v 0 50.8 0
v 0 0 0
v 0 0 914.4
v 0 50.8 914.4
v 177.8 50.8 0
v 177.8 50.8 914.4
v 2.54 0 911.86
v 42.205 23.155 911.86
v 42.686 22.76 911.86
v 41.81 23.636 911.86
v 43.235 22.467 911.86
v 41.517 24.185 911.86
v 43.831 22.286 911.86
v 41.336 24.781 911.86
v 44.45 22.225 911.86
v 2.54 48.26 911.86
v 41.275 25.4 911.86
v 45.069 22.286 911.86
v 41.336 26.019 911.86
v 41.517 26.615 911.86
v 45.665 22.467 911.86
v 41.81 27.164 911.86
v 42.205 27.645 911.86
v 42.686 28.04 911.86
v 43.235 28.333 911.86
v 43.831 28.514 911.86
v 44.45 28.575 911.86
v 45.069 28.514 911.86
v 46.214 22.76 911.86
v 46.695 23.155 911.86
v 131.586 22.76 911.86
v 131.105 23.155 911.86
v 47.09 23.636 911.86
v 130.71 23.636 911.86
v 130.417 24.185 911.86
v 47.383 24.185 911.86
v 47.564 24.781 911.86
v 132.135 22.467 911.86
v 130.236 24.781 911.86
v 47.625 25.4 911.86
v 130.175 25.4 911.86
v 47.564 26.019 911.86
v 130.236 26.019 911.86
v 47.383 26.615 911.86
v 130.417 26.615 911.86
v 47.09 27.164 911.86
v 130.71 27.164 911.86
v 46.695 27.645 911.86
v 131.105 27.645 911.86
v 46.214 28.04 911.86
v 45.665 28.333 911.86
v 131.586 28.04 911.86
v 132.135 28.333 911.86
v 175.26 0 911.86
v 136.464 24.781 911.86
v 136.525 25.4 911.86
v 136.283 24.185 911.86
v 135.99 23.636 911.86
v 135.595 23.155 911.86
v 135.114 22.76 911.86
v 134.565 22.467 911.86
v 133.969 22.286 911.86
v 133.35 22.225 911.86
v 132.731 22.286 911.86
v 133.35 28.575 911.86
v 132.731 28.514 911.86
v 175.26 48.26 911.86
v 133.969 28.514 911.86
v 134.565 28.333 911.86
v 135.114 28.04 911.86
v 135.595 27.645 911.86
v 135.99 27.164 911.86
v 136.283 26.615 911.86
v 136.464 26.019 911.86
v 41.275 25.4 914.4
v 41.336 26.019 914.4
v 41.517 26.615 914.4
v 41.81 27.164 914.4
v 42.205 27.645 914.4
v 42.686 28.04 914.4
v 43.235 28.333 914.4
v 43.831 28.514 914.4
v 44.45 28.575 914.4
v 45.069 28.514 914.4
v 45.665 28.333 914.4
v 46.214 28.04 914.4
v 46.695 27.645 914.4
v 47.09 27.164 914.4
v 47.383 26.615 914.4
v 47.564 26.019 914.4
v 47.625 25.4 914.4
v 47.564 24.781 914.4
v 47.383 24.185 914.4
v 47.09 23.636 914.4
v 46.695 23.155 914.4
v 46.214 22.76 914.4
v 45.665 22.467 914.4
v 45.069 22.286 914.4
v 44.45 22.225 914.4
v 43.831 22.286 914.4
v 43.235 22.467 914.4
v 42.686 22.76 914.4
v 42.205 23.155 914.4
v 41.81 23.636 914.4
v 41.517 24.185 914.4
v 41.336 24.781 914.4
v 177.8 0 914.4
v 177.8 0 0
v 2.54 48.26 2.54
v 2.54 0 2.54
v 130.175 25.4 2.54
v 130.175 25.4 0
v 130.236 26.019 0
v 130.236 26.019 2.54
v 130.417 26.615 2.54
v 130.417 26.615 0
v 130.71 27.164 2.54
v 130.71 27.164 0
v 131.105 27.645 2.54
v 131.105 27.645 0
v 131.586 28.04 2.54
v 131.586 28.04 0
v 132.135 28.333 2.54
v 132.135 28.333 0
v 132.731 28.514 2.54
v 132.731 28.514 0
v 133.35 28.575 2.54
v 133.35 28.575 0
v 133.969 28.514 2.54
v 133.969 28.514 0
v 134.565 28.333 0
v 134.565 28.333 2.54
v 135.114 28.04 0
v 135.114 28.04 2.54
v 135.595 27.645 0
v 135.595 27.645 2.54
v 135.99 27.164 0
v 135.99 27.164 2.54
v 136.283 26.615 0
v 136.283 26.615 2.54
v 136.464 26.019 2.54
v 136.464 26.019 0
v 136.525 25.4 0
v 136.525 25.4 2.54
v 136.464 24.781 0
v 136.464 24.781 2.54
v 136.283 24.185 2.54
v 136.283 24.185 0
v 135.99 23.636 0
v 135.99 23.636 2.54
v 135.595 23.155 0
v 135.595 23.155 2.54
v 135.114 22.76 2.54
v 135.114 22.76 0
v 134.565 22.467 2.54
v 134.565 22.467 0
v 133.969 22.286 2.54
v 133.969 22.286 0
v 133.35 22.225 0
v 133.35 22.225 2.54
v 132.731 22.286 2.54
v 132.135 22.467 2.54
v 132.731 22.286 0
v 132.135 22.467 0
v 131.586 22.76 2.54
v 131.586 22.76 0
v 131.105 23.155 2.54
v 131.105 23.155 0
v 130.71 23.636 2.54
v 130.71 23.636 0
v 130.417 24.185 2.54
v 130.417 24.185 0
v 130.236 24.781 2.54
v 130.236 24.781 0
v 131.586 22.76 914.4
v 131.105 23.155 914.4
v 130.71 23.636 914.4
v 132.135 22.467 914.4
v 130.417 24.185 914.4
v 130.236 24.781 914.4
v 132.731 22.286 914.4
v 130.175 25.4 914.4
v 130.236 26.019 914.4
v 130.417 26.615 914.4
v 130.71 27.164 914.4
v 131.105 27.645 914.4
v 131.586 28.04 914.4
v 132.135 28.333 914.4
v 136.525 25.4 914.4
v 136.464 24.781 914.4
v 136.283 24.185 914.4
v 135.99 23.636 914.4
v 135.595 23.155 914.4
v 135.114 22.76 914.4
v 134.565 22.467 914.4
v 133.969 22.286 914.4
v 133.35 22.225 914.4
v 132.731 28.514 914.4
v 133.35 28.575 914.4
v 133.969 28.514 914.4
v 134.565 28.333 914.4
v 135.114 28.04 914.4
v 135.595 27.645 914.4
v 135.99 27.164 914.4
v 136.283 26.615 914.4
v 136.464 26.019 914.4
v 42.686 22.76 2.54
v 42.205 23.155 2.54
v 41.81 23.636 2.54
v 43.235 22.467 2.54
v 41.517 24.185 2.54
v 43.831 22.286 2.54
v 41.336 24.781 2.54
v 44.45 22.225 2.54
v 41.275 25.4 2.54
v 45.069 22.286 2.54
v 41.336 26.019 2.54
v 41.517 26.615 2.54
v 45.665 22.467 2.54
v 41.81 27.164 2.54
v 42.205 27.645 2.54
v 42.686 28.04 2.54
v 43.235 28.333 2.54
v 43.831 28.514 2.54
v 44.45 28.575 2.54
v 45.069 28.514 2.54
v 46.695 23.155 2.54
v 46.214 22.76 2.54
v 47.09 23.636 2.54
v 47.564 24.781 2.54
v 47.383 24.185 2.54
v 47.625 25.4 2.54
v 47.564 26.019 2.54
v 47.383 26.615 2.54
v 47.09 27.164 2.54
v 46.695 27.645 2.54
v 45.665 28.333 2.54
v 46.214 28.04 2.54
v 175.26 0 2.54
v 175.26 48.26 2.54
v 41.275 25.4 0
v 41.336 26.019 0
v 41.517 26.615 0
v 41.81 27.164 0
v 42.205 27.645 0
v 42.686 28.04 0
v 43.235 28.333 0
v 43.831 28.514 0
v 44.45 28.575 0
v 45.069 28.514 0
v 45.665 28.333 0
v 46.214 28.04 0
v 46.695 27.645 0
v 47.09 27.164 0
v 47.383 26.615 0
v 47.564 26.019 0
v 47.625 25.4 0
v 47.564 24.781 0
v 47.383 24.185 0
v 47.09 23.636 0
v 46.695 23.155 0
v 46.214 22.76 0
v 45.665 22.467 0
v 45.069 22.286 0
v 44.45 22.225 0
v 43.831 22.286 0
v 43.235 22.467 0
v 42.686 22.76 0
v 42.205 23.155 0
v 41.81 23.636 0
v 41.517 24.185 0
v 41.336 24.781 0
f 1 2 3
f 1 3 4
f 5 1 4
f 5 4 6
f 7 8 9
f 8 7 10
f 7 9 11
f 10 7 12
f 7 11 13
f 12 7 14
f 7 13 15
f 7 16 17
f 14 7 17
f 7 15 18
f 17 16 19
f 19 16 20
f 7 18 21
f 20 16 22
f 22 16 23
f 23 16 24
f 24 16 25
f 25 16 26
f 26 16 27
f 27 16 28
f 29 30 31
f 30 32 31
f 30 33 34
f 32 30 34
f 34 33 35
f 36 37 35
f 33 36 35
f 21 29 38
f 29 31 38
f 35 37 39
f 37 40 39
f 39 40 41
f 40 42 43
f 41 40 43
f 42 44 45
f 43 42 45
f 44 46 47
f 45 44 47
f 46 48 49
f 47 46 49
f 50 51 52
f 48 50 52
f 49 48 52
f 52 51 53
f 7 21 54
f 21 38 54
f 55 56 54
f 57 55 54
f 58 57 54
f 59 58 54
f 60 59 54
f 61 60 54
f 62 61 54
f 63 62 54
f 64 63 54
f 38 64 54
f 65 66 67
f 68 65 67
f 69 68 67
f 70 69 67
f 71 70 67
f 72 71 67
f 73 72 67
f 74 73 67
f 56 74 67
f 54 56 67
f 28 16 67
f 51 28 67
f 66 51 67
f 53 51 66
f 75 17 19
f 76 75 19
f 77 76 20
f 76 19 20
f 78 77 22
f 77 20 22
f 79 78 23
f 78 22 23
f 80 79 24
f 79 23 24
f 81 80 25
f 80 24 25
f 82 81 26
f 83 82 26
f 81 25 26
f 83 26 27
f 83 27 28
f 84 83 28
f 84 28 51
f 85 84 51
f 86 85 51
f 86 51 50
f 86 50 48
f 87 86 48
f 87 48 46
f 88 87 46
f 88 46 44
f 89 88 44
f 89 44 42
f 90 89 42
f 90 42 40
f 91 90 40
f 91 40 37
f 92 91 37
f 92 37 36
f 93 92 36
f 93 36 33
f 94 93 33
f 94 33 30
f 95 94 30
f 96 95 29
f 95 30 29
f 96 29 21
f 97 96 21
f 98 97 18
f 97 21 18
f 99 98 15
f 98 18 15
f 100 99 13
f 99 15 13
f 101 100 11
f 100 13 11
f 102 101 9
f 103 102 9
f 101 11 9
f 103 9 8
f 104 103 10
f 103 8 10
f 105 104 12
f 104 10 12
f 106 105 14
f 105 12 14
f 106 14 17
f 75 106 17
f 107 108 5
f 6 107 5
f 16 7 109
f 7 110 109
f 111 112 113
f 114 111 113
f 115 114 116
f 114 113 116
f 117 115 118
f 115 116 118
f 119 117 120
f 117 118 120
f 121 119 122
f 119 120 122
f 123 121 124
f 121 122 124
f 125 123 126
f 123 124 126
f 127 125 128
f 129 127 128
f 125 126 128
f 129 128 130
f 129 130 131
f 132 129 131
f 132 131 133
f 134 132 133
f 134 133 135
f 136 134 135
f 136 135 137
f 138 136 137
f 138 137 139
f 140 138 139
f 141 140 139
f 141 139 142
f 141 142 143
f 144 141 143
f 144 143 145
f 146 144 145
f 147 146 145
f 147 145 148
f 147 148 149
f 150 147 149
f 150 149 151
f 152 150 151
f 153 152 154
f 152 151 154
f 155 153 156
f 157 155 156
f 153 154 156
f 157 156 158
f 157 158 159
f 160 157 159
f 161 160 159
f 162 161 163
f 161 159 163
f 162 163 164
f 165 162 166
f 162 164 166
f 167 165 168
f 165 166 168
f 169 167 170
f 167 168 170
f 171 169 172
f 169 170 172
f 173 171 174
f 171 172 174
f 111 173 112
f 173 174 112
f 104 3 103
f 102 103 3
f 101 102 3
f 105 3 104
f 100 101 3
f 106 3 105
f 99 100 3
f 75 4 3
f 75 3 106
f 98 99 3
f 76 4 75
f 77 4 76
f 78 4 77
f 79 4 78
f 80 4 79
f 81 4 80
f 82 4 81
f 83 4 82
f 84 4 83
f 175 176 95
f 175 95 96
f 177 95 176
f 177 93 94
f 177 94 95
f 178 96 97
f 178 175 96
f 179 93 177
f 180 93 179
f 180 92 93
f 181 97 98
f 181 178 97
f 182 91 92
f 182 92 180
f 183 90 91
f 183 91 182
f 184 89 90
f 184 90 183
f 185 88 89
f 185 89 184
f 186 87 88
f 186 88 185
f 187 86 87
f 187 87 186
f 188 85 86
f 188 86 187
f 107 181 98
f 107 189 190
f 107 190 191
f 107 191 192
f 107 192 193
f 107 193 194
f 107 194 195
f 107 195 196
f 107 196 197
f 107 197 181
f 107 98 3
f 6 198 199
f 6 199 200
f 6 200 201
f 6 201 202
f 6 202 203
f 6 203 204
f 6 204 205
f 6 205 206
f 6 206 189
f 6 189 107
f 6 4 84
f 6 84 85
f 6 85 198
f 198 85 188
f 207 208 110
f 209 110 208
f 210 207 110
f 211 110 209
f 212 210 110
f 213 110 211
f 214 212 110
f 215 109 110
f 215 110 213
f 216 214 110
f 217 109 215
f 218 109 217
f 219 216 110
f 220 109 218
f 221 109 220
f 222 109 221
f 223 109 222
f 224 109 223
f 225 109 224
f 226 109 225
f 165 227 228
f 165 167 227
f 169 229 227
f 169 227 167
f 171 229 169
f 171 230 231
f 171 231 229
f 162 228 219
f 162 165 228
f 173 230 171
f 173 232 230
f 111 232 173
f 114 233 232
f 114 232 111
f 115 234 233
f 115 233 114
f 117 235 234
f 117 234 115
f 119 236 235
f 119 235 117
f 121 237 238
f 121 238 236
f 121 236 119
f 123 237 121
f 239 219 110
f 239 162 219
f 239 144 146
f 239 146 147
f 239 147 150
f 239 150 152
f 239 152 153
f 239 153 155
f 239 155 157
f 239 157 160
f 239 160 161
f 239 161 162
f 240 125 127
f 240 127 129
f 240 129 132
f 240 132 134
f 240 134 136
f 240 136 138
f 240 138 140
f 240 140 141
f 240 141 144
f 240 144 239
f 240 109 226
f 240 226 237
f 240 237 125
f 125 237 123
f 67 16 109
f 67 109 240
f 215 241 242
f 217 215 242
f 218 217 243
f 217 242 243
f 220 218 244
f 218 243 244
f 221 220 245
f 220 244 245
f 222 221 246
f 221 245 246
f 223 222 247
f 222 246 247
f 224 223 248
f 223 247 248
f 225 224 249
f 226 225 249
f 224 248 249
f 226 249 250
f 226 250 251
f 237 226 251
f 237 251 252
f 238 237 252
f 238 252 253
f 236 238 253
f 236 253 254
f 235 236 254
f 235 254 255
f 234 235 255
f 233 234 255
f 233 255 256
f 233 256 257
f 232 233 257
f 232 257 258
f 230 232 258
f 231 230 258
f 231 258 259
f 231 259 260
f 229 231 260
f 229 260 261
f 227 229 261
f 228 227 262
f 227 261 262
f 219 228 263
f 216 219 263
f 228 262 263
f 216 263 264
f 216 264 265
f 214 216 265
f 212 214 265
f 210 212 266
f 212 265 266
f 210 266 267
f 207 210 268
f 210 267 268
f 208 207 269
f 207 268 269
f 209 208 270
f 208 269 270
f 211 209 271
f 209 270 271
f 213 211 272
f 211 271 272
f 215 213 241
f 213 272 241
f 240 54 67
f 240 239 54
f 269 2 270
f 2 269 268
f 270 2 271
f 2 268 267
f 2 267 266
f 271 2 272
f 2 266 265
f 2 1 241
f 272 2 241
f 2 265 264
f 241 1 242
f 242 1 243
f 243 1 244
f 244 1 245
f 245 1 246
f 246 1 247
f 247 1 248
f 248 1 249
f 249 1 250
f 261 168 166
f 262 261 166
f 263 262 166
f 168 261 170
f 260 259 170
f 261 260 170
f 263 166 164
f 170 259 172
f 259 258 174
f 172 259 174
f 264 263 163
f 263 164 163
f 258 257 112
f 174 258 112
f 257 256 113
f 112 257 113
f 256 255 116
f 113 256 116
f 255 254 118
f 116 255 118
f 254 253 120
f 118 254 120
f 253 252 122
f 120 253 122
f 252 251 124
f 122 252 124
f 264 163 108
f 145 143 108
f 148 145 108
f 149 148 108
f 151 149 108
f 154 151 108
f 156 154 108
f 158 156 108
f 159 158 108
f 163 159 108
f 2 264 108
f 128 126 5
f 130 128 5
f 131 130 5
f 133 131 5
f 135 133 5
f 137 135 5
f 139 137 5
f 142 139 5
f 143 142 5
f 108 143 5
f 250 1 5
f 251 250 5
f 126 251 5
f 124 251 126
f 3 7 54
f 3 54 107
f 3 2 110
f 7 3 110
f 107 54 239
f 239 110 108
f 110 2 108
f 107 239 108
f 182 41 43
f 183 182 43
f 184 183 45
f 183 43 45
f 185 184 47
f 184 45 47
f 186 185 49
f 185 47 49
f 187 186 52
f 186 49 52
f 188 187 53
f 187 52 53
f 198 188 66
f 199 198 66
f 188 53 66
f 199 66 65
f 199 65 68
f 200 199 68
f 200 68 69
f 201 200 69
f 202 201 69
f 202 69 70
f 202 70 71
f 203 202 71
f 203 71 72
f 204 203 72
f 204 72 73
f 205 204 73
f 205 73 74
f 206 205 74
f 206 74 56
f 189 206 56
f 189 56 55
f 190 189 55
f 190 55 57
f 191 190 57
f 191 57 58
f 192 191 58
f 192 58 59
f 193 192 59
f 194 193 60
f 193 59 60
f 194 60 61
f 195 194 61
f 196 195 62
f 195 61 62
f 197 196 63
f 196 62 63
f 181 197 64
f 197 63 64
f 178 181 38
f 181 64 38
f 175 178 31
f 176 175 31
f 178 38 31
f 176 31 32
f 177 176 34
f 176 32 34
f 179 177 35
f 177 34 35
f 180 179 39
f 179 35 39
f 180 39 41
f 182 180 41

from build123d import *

# Parameters (mm, degrees)
SKETCH1_W           = 177.8
SKETCH1_H           = 50.8
BOSS_EXTRUDE1_DEPTH = 914.4
SHELL1_T            = -2.54
SKETCH2_R           = 3.175
CUT_EXTRUDE1_DEPTH  = 945.134


with BuildPart() as part:
    # Sketch1 → Boss-Extrude1 (new body)
    with BuildSketch(Plane.XY):
        with Locations((88.9, 25.4)):
            Rectangle(SKETCH1_W, SKETCH1_H)
    extrude(amount=BOSS_EXTRUDE1_DEPTH)

    # Shell1
    shell1_openings = [part.faces().sort_by_distance(p)[0] for p in [
        (88.9, 0, 457.2),
    ]]
    offset(amount=SHELL1_T, openings=shell1_openings, kind=Kind.INTERSECTION)

    # Sketch2 → Cut-Extrude1 (cut)
    with BuildSketch(Plane(origin=(0, 0, 0), x_dir=(-1, 0, 0), z_dir=(0, 0, -1))):
        with Locations((-44.45, 25.4)):
            Circle(SKETCH2_R)
        with Locations((-133.35, 25.4)):
            Circle(SKETCH2_R)
    extrude(amount=-CUT_EXTRUDE1_DEPTH, mode=Mode.SUBTRACT)


solid = part.part
